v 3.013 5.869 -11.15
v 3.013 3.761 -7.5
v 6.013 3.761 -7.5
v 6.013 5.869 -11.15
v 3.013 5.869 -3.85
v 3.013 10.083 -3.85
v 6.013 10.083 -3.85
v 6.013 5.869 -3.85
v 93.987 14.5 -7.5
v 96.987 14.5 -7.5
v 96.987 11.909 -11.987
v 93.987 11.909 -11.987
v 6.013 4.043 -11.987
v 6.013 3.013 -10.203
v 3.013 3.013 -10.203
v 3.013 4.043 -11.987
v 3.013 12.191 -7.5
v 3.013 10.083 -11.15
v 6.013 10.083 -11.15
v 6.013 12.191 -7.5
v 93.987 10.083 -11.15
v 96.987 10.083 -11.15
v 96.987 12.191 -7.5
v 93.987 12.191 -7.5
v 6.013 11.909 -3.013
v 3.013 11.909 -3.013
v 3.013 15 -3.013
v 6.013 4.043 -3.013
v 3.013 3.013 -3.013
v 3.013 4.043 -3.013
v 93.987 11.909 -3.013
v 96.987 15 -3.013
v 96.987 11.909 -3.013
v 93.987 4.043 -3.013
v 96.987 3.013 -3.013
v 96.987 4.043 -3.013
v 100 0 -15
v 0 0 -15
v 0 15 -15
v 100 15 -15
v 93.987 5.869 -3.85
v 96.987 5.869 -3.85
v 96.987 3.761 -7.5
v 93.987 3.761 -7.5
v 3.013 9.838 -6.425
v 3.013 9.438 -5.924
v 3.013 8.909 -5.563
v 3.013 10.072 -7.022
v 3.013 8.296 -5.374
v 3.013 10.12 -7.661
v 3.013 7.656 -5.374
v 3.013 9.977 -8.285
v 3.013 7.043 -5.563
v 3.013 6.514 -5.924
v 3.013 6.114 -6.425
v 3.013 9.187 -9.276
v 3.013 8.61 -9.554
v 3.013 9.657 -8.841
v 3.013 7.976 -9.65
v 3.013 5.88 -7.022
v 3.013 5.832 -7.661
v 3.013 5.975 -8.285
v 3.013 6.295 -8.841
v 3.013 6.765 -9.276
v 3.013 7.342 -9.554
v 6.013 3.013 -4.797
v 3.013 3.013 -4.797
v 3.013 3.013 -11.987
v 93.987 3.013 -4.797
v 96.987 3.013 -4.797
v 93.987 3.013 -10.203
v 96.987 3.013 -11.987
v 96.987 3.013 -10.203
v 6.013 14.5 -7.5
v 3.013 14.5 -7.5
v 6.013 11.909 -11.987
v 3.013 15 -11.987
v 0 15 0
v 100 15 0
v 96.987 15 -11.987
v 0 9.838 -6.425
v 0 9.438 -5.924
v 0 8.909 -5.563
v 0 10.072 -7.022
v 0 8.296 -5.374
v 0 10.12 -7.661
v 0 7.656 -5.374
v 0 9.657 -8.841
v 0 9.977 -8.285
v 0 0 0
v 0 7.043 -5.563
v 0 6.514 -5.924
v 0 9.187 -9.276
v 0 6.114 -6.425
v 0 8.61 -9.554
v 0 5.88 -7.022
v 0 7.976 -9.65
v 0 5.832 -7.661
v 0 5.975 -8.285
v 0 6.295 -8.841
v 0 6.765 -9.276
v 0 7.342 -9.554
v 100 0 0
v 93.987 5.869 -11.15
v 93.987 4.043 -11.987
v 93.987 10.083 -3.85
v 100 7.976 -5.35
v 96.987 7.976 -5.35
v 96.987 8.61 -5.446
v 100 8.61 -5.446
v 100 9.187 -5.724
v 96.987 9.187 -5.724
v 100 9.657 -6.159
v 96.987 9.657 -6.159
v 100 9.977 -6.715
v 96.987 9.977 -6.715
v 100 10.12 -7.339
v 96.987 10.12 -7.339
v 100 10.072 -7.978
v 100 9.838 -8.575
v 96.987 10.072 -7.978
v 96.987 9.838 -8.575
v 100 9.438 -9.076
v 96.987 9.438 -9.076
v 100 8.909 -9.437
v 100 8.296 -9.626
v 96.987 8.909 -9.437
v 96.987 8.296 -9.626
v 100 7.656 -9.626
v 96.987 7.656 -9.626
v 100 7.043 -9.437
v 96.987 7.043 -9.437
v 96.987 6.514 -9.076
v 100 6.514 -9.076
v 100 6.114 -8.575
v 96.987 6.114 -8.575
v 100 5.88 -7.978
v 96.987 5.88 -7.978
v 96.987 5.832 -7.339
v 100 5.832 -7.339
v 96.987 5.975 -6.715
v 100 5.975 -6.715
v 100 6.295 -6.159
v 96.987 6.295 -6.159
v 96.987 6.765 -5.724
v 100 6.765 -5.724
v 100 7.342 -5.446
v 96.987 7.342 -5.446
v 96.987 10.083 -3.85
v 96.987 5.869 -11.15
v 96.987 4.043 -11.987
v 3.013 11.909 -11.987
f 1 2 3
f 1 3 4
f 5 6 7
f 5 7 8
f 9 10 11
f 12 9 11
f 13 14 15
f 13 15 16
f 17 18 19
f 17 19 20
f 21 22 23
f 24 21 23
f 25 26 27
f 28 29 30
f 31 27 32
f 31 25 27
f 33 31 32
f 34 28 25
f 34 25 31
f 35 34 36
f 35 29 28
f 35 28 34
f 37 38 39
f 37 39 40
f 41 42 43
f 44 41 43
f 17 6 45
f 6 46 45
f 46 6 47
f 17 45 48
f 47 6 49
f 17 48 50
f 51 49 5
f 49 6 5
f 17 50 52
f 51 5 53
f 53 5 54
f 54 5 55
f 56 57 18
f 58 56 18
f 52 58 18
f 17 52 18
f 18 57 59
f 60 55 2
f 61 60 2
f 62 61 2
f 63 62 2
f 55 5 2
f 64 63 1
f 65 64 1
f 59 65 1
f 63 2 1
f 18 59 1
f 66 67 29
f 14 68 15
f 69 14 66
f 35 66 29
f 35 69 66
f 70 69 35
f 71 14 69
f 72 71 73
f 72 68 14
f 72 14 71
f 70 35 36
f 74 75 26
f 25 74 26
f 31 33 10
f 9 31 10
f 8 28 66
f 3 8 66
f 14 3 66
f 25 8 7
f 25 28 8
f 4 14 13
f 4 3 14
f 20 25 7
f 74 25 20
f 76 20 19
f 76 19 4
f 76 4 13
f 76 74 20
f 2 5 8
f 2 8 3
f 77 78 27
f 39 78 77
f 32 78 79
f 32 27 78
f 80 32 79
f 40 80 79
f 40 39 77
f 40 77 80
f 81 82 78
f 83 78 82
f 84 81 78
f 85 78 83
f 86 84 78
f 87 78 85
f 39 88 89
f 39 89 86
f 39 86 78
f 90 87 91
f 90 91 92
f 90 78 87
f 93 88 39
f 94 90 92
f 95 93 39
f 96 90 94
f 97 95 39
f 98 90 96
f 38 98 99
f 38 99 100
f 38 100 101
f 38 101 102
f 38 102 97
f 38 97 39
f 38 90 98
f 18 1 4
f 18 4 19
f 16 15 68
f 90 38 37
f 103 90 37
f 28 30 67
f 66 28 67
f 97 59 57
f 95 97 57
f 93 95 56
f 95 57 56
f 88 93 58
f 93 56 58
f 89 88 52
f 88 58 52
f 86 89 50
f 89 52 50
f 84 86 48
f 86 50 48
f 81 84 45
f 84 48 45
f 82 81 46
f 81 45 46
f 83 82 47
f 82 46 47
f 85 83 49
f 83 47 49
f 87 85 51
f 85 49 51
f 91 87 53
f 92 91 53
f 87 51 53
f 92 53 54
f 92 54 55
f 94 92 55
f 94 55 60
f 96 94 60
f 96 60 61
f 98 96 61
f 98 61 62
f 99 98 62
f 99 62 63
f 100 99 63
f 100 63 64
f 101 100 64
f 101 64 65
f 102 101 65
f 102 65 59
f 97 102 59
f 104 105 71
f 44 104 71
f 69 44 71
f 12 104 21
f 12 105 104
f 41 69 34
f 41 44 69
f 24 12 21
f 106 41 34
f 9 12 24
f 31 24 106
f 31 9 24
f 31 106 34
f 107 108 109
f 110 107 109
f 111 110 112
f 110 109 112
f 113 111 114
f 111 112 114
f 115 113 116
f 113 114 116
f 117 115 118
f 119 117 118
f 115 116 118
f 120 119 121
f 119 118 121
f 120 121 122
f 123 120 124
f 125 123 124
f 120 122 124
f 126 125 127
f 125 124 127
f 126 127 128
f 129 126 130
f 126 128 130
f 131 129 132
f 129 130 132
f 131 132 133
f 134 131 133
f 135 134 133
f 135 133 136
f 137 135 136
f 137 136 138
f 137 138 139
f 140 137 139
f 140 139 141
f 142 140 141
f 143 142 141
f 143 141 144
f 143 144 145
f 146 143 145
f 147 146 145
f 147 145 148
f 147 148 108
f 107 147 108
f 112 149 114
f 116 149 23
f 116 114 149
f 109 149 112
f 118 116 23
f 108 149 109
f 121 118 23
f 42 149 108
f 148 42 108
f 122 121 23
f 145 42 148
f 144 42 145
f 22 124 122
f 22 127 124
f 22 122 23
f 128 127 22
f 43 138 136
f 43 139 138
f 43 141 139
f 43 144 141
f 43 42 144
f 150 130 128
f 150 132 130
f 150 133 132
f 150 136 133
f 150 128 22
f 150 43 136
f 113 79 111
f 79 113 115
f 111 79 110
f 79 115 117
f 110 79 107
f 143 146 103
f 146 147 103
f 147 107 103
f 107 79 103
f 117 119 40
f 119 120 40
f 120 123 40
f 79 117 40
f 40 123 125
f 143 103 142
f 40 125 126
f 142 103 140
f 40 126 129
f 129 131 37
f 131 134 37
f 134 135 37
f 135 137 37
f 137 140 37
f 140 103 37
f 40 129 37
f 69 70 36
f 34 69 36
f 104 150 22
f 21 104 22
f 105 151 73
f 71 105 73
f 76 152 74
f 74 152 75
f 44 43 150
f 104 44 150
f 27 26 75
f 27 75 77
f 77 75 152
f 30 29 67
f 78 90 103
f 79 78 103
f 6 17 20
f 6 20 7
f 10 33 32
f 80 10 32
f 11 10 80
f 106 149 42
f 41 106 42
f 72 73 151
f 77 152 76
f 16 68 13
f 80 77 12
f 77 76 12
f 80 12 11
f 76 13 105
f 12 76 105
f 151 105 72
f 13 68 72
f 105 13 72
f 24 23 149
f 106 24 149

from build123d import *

# Parameters (mm, degrees)
SKETCH_1_W          = 100
SKETCH_1_H          = 15
EXTRUDE_1_DEPTH     = 15
SHELL_1_T           = -3.01271481
EXTRUDE_2_DEPTH     = 3
SKETCH_4_R          = 2.15
CUT_EXTRUDE_1_DEPTH = 4.01271481
EXTRUDE_3_DEPTH     = 3
SKETCH_6_R          = 2.15
CUT_EXTRUDE_2_DEPTH = 4.01271481


with BuildPart() as part:
    # 草图1 → 凸台-拉伸1 (new body)
    with BuildSketch(Plane(origin=(0, 0, 0), x_dir=(1, 0, 0), z_dir=(0, 1, 0))):
        with Locations((50, 7.5)):
            Rectangle(SKETCH_1_W, SKETCH_1_H)
    extrude(amount=EXTRUDE_1_DEPTH)

    # 抽壳1
    shell_1_openings = [part.faces().sort_by_distance(p)[0] for p in [
        (50, 15, -7.5),
    ]]
    offset(amount=SHELL_1_T, openings=shell_1_openings, kind=Kind.INTERSECTION)

    # 草图3 → 凸台-拉伸2 (add)
    with BuildSketch(Plane(origin=(3.01271481, 0, 0), x_dir=(0, 0, -1), z_dir=(1, 0, 0))):
        Polygon((1.85, 4.713912937), (7.5, 1.451883916), (13.15, 4.713912937), (13.15, 11.237970979), (7.5, 14.5), (1.85, 11.237970979), align=None)
        Polygon((7.5, 3.761284993), (11.15, 5.868613476), (11.15, 10.083270441), (7.5, 12.190598923), (3.85, 10.083270441), (3.85, 5.868613476), align=None, mode=Mode.SUBTRACT)
    extrude(amount=EXTRUDE_2_DEPTH)

    # 草图4 → 切除-拉伸1 (cut, through all)
    with BuildSketch(Plane(origin=(3.01271481, 0, 0), x_dir=(0, 0, -1), z_dir=(1, 0, 0))):
        with Locations((7.5, 7.975941958)):
            Circle(SKETCH_4_R)
    extrude(amount=-CUT_EXTRUDE_1_DEPTH, mode=Mode.SUBTRACT)

    # 草图5 → 凸台-拉伸3 (add)
    with BuildSketch(Plane.ZY.offset(-96.98728519)):
        Polygon((-3.01271481, 11.909264688), (-7.5, 14.5), (-11.98728519, 11.909264688), (-11.98728519, 4.042619229), (-10.20343841, 3.01271481), (-4.79656159, 3.01271481), (-3.01271481, 4.042619229), align=None)
        Polygon((-11.15, 10.083270441), (-7.5, 12.190598923), (-3.85, 10.083270441), (-3.85, 5.868613476), (-7.5, 3.761284993), (-11.15, 5.868613476), align=None, mode=Mode.SUBTRACT)
    extrude(amount=EXTRUDE_3_DEPTH)

    # 草图6 → 切除-拉伸2 (cut, through all)
    with BuildSketch(Plane.ZY.offset(-96.98728519)):
        with Locations((-7.5, 7.975941958)):
            Circle(SKETCH_6_R)
    extrude(amount=-CUT_EXTRUDE_2_DEPTH, mode=Mode.SUBTRACT)


solid = part.part
